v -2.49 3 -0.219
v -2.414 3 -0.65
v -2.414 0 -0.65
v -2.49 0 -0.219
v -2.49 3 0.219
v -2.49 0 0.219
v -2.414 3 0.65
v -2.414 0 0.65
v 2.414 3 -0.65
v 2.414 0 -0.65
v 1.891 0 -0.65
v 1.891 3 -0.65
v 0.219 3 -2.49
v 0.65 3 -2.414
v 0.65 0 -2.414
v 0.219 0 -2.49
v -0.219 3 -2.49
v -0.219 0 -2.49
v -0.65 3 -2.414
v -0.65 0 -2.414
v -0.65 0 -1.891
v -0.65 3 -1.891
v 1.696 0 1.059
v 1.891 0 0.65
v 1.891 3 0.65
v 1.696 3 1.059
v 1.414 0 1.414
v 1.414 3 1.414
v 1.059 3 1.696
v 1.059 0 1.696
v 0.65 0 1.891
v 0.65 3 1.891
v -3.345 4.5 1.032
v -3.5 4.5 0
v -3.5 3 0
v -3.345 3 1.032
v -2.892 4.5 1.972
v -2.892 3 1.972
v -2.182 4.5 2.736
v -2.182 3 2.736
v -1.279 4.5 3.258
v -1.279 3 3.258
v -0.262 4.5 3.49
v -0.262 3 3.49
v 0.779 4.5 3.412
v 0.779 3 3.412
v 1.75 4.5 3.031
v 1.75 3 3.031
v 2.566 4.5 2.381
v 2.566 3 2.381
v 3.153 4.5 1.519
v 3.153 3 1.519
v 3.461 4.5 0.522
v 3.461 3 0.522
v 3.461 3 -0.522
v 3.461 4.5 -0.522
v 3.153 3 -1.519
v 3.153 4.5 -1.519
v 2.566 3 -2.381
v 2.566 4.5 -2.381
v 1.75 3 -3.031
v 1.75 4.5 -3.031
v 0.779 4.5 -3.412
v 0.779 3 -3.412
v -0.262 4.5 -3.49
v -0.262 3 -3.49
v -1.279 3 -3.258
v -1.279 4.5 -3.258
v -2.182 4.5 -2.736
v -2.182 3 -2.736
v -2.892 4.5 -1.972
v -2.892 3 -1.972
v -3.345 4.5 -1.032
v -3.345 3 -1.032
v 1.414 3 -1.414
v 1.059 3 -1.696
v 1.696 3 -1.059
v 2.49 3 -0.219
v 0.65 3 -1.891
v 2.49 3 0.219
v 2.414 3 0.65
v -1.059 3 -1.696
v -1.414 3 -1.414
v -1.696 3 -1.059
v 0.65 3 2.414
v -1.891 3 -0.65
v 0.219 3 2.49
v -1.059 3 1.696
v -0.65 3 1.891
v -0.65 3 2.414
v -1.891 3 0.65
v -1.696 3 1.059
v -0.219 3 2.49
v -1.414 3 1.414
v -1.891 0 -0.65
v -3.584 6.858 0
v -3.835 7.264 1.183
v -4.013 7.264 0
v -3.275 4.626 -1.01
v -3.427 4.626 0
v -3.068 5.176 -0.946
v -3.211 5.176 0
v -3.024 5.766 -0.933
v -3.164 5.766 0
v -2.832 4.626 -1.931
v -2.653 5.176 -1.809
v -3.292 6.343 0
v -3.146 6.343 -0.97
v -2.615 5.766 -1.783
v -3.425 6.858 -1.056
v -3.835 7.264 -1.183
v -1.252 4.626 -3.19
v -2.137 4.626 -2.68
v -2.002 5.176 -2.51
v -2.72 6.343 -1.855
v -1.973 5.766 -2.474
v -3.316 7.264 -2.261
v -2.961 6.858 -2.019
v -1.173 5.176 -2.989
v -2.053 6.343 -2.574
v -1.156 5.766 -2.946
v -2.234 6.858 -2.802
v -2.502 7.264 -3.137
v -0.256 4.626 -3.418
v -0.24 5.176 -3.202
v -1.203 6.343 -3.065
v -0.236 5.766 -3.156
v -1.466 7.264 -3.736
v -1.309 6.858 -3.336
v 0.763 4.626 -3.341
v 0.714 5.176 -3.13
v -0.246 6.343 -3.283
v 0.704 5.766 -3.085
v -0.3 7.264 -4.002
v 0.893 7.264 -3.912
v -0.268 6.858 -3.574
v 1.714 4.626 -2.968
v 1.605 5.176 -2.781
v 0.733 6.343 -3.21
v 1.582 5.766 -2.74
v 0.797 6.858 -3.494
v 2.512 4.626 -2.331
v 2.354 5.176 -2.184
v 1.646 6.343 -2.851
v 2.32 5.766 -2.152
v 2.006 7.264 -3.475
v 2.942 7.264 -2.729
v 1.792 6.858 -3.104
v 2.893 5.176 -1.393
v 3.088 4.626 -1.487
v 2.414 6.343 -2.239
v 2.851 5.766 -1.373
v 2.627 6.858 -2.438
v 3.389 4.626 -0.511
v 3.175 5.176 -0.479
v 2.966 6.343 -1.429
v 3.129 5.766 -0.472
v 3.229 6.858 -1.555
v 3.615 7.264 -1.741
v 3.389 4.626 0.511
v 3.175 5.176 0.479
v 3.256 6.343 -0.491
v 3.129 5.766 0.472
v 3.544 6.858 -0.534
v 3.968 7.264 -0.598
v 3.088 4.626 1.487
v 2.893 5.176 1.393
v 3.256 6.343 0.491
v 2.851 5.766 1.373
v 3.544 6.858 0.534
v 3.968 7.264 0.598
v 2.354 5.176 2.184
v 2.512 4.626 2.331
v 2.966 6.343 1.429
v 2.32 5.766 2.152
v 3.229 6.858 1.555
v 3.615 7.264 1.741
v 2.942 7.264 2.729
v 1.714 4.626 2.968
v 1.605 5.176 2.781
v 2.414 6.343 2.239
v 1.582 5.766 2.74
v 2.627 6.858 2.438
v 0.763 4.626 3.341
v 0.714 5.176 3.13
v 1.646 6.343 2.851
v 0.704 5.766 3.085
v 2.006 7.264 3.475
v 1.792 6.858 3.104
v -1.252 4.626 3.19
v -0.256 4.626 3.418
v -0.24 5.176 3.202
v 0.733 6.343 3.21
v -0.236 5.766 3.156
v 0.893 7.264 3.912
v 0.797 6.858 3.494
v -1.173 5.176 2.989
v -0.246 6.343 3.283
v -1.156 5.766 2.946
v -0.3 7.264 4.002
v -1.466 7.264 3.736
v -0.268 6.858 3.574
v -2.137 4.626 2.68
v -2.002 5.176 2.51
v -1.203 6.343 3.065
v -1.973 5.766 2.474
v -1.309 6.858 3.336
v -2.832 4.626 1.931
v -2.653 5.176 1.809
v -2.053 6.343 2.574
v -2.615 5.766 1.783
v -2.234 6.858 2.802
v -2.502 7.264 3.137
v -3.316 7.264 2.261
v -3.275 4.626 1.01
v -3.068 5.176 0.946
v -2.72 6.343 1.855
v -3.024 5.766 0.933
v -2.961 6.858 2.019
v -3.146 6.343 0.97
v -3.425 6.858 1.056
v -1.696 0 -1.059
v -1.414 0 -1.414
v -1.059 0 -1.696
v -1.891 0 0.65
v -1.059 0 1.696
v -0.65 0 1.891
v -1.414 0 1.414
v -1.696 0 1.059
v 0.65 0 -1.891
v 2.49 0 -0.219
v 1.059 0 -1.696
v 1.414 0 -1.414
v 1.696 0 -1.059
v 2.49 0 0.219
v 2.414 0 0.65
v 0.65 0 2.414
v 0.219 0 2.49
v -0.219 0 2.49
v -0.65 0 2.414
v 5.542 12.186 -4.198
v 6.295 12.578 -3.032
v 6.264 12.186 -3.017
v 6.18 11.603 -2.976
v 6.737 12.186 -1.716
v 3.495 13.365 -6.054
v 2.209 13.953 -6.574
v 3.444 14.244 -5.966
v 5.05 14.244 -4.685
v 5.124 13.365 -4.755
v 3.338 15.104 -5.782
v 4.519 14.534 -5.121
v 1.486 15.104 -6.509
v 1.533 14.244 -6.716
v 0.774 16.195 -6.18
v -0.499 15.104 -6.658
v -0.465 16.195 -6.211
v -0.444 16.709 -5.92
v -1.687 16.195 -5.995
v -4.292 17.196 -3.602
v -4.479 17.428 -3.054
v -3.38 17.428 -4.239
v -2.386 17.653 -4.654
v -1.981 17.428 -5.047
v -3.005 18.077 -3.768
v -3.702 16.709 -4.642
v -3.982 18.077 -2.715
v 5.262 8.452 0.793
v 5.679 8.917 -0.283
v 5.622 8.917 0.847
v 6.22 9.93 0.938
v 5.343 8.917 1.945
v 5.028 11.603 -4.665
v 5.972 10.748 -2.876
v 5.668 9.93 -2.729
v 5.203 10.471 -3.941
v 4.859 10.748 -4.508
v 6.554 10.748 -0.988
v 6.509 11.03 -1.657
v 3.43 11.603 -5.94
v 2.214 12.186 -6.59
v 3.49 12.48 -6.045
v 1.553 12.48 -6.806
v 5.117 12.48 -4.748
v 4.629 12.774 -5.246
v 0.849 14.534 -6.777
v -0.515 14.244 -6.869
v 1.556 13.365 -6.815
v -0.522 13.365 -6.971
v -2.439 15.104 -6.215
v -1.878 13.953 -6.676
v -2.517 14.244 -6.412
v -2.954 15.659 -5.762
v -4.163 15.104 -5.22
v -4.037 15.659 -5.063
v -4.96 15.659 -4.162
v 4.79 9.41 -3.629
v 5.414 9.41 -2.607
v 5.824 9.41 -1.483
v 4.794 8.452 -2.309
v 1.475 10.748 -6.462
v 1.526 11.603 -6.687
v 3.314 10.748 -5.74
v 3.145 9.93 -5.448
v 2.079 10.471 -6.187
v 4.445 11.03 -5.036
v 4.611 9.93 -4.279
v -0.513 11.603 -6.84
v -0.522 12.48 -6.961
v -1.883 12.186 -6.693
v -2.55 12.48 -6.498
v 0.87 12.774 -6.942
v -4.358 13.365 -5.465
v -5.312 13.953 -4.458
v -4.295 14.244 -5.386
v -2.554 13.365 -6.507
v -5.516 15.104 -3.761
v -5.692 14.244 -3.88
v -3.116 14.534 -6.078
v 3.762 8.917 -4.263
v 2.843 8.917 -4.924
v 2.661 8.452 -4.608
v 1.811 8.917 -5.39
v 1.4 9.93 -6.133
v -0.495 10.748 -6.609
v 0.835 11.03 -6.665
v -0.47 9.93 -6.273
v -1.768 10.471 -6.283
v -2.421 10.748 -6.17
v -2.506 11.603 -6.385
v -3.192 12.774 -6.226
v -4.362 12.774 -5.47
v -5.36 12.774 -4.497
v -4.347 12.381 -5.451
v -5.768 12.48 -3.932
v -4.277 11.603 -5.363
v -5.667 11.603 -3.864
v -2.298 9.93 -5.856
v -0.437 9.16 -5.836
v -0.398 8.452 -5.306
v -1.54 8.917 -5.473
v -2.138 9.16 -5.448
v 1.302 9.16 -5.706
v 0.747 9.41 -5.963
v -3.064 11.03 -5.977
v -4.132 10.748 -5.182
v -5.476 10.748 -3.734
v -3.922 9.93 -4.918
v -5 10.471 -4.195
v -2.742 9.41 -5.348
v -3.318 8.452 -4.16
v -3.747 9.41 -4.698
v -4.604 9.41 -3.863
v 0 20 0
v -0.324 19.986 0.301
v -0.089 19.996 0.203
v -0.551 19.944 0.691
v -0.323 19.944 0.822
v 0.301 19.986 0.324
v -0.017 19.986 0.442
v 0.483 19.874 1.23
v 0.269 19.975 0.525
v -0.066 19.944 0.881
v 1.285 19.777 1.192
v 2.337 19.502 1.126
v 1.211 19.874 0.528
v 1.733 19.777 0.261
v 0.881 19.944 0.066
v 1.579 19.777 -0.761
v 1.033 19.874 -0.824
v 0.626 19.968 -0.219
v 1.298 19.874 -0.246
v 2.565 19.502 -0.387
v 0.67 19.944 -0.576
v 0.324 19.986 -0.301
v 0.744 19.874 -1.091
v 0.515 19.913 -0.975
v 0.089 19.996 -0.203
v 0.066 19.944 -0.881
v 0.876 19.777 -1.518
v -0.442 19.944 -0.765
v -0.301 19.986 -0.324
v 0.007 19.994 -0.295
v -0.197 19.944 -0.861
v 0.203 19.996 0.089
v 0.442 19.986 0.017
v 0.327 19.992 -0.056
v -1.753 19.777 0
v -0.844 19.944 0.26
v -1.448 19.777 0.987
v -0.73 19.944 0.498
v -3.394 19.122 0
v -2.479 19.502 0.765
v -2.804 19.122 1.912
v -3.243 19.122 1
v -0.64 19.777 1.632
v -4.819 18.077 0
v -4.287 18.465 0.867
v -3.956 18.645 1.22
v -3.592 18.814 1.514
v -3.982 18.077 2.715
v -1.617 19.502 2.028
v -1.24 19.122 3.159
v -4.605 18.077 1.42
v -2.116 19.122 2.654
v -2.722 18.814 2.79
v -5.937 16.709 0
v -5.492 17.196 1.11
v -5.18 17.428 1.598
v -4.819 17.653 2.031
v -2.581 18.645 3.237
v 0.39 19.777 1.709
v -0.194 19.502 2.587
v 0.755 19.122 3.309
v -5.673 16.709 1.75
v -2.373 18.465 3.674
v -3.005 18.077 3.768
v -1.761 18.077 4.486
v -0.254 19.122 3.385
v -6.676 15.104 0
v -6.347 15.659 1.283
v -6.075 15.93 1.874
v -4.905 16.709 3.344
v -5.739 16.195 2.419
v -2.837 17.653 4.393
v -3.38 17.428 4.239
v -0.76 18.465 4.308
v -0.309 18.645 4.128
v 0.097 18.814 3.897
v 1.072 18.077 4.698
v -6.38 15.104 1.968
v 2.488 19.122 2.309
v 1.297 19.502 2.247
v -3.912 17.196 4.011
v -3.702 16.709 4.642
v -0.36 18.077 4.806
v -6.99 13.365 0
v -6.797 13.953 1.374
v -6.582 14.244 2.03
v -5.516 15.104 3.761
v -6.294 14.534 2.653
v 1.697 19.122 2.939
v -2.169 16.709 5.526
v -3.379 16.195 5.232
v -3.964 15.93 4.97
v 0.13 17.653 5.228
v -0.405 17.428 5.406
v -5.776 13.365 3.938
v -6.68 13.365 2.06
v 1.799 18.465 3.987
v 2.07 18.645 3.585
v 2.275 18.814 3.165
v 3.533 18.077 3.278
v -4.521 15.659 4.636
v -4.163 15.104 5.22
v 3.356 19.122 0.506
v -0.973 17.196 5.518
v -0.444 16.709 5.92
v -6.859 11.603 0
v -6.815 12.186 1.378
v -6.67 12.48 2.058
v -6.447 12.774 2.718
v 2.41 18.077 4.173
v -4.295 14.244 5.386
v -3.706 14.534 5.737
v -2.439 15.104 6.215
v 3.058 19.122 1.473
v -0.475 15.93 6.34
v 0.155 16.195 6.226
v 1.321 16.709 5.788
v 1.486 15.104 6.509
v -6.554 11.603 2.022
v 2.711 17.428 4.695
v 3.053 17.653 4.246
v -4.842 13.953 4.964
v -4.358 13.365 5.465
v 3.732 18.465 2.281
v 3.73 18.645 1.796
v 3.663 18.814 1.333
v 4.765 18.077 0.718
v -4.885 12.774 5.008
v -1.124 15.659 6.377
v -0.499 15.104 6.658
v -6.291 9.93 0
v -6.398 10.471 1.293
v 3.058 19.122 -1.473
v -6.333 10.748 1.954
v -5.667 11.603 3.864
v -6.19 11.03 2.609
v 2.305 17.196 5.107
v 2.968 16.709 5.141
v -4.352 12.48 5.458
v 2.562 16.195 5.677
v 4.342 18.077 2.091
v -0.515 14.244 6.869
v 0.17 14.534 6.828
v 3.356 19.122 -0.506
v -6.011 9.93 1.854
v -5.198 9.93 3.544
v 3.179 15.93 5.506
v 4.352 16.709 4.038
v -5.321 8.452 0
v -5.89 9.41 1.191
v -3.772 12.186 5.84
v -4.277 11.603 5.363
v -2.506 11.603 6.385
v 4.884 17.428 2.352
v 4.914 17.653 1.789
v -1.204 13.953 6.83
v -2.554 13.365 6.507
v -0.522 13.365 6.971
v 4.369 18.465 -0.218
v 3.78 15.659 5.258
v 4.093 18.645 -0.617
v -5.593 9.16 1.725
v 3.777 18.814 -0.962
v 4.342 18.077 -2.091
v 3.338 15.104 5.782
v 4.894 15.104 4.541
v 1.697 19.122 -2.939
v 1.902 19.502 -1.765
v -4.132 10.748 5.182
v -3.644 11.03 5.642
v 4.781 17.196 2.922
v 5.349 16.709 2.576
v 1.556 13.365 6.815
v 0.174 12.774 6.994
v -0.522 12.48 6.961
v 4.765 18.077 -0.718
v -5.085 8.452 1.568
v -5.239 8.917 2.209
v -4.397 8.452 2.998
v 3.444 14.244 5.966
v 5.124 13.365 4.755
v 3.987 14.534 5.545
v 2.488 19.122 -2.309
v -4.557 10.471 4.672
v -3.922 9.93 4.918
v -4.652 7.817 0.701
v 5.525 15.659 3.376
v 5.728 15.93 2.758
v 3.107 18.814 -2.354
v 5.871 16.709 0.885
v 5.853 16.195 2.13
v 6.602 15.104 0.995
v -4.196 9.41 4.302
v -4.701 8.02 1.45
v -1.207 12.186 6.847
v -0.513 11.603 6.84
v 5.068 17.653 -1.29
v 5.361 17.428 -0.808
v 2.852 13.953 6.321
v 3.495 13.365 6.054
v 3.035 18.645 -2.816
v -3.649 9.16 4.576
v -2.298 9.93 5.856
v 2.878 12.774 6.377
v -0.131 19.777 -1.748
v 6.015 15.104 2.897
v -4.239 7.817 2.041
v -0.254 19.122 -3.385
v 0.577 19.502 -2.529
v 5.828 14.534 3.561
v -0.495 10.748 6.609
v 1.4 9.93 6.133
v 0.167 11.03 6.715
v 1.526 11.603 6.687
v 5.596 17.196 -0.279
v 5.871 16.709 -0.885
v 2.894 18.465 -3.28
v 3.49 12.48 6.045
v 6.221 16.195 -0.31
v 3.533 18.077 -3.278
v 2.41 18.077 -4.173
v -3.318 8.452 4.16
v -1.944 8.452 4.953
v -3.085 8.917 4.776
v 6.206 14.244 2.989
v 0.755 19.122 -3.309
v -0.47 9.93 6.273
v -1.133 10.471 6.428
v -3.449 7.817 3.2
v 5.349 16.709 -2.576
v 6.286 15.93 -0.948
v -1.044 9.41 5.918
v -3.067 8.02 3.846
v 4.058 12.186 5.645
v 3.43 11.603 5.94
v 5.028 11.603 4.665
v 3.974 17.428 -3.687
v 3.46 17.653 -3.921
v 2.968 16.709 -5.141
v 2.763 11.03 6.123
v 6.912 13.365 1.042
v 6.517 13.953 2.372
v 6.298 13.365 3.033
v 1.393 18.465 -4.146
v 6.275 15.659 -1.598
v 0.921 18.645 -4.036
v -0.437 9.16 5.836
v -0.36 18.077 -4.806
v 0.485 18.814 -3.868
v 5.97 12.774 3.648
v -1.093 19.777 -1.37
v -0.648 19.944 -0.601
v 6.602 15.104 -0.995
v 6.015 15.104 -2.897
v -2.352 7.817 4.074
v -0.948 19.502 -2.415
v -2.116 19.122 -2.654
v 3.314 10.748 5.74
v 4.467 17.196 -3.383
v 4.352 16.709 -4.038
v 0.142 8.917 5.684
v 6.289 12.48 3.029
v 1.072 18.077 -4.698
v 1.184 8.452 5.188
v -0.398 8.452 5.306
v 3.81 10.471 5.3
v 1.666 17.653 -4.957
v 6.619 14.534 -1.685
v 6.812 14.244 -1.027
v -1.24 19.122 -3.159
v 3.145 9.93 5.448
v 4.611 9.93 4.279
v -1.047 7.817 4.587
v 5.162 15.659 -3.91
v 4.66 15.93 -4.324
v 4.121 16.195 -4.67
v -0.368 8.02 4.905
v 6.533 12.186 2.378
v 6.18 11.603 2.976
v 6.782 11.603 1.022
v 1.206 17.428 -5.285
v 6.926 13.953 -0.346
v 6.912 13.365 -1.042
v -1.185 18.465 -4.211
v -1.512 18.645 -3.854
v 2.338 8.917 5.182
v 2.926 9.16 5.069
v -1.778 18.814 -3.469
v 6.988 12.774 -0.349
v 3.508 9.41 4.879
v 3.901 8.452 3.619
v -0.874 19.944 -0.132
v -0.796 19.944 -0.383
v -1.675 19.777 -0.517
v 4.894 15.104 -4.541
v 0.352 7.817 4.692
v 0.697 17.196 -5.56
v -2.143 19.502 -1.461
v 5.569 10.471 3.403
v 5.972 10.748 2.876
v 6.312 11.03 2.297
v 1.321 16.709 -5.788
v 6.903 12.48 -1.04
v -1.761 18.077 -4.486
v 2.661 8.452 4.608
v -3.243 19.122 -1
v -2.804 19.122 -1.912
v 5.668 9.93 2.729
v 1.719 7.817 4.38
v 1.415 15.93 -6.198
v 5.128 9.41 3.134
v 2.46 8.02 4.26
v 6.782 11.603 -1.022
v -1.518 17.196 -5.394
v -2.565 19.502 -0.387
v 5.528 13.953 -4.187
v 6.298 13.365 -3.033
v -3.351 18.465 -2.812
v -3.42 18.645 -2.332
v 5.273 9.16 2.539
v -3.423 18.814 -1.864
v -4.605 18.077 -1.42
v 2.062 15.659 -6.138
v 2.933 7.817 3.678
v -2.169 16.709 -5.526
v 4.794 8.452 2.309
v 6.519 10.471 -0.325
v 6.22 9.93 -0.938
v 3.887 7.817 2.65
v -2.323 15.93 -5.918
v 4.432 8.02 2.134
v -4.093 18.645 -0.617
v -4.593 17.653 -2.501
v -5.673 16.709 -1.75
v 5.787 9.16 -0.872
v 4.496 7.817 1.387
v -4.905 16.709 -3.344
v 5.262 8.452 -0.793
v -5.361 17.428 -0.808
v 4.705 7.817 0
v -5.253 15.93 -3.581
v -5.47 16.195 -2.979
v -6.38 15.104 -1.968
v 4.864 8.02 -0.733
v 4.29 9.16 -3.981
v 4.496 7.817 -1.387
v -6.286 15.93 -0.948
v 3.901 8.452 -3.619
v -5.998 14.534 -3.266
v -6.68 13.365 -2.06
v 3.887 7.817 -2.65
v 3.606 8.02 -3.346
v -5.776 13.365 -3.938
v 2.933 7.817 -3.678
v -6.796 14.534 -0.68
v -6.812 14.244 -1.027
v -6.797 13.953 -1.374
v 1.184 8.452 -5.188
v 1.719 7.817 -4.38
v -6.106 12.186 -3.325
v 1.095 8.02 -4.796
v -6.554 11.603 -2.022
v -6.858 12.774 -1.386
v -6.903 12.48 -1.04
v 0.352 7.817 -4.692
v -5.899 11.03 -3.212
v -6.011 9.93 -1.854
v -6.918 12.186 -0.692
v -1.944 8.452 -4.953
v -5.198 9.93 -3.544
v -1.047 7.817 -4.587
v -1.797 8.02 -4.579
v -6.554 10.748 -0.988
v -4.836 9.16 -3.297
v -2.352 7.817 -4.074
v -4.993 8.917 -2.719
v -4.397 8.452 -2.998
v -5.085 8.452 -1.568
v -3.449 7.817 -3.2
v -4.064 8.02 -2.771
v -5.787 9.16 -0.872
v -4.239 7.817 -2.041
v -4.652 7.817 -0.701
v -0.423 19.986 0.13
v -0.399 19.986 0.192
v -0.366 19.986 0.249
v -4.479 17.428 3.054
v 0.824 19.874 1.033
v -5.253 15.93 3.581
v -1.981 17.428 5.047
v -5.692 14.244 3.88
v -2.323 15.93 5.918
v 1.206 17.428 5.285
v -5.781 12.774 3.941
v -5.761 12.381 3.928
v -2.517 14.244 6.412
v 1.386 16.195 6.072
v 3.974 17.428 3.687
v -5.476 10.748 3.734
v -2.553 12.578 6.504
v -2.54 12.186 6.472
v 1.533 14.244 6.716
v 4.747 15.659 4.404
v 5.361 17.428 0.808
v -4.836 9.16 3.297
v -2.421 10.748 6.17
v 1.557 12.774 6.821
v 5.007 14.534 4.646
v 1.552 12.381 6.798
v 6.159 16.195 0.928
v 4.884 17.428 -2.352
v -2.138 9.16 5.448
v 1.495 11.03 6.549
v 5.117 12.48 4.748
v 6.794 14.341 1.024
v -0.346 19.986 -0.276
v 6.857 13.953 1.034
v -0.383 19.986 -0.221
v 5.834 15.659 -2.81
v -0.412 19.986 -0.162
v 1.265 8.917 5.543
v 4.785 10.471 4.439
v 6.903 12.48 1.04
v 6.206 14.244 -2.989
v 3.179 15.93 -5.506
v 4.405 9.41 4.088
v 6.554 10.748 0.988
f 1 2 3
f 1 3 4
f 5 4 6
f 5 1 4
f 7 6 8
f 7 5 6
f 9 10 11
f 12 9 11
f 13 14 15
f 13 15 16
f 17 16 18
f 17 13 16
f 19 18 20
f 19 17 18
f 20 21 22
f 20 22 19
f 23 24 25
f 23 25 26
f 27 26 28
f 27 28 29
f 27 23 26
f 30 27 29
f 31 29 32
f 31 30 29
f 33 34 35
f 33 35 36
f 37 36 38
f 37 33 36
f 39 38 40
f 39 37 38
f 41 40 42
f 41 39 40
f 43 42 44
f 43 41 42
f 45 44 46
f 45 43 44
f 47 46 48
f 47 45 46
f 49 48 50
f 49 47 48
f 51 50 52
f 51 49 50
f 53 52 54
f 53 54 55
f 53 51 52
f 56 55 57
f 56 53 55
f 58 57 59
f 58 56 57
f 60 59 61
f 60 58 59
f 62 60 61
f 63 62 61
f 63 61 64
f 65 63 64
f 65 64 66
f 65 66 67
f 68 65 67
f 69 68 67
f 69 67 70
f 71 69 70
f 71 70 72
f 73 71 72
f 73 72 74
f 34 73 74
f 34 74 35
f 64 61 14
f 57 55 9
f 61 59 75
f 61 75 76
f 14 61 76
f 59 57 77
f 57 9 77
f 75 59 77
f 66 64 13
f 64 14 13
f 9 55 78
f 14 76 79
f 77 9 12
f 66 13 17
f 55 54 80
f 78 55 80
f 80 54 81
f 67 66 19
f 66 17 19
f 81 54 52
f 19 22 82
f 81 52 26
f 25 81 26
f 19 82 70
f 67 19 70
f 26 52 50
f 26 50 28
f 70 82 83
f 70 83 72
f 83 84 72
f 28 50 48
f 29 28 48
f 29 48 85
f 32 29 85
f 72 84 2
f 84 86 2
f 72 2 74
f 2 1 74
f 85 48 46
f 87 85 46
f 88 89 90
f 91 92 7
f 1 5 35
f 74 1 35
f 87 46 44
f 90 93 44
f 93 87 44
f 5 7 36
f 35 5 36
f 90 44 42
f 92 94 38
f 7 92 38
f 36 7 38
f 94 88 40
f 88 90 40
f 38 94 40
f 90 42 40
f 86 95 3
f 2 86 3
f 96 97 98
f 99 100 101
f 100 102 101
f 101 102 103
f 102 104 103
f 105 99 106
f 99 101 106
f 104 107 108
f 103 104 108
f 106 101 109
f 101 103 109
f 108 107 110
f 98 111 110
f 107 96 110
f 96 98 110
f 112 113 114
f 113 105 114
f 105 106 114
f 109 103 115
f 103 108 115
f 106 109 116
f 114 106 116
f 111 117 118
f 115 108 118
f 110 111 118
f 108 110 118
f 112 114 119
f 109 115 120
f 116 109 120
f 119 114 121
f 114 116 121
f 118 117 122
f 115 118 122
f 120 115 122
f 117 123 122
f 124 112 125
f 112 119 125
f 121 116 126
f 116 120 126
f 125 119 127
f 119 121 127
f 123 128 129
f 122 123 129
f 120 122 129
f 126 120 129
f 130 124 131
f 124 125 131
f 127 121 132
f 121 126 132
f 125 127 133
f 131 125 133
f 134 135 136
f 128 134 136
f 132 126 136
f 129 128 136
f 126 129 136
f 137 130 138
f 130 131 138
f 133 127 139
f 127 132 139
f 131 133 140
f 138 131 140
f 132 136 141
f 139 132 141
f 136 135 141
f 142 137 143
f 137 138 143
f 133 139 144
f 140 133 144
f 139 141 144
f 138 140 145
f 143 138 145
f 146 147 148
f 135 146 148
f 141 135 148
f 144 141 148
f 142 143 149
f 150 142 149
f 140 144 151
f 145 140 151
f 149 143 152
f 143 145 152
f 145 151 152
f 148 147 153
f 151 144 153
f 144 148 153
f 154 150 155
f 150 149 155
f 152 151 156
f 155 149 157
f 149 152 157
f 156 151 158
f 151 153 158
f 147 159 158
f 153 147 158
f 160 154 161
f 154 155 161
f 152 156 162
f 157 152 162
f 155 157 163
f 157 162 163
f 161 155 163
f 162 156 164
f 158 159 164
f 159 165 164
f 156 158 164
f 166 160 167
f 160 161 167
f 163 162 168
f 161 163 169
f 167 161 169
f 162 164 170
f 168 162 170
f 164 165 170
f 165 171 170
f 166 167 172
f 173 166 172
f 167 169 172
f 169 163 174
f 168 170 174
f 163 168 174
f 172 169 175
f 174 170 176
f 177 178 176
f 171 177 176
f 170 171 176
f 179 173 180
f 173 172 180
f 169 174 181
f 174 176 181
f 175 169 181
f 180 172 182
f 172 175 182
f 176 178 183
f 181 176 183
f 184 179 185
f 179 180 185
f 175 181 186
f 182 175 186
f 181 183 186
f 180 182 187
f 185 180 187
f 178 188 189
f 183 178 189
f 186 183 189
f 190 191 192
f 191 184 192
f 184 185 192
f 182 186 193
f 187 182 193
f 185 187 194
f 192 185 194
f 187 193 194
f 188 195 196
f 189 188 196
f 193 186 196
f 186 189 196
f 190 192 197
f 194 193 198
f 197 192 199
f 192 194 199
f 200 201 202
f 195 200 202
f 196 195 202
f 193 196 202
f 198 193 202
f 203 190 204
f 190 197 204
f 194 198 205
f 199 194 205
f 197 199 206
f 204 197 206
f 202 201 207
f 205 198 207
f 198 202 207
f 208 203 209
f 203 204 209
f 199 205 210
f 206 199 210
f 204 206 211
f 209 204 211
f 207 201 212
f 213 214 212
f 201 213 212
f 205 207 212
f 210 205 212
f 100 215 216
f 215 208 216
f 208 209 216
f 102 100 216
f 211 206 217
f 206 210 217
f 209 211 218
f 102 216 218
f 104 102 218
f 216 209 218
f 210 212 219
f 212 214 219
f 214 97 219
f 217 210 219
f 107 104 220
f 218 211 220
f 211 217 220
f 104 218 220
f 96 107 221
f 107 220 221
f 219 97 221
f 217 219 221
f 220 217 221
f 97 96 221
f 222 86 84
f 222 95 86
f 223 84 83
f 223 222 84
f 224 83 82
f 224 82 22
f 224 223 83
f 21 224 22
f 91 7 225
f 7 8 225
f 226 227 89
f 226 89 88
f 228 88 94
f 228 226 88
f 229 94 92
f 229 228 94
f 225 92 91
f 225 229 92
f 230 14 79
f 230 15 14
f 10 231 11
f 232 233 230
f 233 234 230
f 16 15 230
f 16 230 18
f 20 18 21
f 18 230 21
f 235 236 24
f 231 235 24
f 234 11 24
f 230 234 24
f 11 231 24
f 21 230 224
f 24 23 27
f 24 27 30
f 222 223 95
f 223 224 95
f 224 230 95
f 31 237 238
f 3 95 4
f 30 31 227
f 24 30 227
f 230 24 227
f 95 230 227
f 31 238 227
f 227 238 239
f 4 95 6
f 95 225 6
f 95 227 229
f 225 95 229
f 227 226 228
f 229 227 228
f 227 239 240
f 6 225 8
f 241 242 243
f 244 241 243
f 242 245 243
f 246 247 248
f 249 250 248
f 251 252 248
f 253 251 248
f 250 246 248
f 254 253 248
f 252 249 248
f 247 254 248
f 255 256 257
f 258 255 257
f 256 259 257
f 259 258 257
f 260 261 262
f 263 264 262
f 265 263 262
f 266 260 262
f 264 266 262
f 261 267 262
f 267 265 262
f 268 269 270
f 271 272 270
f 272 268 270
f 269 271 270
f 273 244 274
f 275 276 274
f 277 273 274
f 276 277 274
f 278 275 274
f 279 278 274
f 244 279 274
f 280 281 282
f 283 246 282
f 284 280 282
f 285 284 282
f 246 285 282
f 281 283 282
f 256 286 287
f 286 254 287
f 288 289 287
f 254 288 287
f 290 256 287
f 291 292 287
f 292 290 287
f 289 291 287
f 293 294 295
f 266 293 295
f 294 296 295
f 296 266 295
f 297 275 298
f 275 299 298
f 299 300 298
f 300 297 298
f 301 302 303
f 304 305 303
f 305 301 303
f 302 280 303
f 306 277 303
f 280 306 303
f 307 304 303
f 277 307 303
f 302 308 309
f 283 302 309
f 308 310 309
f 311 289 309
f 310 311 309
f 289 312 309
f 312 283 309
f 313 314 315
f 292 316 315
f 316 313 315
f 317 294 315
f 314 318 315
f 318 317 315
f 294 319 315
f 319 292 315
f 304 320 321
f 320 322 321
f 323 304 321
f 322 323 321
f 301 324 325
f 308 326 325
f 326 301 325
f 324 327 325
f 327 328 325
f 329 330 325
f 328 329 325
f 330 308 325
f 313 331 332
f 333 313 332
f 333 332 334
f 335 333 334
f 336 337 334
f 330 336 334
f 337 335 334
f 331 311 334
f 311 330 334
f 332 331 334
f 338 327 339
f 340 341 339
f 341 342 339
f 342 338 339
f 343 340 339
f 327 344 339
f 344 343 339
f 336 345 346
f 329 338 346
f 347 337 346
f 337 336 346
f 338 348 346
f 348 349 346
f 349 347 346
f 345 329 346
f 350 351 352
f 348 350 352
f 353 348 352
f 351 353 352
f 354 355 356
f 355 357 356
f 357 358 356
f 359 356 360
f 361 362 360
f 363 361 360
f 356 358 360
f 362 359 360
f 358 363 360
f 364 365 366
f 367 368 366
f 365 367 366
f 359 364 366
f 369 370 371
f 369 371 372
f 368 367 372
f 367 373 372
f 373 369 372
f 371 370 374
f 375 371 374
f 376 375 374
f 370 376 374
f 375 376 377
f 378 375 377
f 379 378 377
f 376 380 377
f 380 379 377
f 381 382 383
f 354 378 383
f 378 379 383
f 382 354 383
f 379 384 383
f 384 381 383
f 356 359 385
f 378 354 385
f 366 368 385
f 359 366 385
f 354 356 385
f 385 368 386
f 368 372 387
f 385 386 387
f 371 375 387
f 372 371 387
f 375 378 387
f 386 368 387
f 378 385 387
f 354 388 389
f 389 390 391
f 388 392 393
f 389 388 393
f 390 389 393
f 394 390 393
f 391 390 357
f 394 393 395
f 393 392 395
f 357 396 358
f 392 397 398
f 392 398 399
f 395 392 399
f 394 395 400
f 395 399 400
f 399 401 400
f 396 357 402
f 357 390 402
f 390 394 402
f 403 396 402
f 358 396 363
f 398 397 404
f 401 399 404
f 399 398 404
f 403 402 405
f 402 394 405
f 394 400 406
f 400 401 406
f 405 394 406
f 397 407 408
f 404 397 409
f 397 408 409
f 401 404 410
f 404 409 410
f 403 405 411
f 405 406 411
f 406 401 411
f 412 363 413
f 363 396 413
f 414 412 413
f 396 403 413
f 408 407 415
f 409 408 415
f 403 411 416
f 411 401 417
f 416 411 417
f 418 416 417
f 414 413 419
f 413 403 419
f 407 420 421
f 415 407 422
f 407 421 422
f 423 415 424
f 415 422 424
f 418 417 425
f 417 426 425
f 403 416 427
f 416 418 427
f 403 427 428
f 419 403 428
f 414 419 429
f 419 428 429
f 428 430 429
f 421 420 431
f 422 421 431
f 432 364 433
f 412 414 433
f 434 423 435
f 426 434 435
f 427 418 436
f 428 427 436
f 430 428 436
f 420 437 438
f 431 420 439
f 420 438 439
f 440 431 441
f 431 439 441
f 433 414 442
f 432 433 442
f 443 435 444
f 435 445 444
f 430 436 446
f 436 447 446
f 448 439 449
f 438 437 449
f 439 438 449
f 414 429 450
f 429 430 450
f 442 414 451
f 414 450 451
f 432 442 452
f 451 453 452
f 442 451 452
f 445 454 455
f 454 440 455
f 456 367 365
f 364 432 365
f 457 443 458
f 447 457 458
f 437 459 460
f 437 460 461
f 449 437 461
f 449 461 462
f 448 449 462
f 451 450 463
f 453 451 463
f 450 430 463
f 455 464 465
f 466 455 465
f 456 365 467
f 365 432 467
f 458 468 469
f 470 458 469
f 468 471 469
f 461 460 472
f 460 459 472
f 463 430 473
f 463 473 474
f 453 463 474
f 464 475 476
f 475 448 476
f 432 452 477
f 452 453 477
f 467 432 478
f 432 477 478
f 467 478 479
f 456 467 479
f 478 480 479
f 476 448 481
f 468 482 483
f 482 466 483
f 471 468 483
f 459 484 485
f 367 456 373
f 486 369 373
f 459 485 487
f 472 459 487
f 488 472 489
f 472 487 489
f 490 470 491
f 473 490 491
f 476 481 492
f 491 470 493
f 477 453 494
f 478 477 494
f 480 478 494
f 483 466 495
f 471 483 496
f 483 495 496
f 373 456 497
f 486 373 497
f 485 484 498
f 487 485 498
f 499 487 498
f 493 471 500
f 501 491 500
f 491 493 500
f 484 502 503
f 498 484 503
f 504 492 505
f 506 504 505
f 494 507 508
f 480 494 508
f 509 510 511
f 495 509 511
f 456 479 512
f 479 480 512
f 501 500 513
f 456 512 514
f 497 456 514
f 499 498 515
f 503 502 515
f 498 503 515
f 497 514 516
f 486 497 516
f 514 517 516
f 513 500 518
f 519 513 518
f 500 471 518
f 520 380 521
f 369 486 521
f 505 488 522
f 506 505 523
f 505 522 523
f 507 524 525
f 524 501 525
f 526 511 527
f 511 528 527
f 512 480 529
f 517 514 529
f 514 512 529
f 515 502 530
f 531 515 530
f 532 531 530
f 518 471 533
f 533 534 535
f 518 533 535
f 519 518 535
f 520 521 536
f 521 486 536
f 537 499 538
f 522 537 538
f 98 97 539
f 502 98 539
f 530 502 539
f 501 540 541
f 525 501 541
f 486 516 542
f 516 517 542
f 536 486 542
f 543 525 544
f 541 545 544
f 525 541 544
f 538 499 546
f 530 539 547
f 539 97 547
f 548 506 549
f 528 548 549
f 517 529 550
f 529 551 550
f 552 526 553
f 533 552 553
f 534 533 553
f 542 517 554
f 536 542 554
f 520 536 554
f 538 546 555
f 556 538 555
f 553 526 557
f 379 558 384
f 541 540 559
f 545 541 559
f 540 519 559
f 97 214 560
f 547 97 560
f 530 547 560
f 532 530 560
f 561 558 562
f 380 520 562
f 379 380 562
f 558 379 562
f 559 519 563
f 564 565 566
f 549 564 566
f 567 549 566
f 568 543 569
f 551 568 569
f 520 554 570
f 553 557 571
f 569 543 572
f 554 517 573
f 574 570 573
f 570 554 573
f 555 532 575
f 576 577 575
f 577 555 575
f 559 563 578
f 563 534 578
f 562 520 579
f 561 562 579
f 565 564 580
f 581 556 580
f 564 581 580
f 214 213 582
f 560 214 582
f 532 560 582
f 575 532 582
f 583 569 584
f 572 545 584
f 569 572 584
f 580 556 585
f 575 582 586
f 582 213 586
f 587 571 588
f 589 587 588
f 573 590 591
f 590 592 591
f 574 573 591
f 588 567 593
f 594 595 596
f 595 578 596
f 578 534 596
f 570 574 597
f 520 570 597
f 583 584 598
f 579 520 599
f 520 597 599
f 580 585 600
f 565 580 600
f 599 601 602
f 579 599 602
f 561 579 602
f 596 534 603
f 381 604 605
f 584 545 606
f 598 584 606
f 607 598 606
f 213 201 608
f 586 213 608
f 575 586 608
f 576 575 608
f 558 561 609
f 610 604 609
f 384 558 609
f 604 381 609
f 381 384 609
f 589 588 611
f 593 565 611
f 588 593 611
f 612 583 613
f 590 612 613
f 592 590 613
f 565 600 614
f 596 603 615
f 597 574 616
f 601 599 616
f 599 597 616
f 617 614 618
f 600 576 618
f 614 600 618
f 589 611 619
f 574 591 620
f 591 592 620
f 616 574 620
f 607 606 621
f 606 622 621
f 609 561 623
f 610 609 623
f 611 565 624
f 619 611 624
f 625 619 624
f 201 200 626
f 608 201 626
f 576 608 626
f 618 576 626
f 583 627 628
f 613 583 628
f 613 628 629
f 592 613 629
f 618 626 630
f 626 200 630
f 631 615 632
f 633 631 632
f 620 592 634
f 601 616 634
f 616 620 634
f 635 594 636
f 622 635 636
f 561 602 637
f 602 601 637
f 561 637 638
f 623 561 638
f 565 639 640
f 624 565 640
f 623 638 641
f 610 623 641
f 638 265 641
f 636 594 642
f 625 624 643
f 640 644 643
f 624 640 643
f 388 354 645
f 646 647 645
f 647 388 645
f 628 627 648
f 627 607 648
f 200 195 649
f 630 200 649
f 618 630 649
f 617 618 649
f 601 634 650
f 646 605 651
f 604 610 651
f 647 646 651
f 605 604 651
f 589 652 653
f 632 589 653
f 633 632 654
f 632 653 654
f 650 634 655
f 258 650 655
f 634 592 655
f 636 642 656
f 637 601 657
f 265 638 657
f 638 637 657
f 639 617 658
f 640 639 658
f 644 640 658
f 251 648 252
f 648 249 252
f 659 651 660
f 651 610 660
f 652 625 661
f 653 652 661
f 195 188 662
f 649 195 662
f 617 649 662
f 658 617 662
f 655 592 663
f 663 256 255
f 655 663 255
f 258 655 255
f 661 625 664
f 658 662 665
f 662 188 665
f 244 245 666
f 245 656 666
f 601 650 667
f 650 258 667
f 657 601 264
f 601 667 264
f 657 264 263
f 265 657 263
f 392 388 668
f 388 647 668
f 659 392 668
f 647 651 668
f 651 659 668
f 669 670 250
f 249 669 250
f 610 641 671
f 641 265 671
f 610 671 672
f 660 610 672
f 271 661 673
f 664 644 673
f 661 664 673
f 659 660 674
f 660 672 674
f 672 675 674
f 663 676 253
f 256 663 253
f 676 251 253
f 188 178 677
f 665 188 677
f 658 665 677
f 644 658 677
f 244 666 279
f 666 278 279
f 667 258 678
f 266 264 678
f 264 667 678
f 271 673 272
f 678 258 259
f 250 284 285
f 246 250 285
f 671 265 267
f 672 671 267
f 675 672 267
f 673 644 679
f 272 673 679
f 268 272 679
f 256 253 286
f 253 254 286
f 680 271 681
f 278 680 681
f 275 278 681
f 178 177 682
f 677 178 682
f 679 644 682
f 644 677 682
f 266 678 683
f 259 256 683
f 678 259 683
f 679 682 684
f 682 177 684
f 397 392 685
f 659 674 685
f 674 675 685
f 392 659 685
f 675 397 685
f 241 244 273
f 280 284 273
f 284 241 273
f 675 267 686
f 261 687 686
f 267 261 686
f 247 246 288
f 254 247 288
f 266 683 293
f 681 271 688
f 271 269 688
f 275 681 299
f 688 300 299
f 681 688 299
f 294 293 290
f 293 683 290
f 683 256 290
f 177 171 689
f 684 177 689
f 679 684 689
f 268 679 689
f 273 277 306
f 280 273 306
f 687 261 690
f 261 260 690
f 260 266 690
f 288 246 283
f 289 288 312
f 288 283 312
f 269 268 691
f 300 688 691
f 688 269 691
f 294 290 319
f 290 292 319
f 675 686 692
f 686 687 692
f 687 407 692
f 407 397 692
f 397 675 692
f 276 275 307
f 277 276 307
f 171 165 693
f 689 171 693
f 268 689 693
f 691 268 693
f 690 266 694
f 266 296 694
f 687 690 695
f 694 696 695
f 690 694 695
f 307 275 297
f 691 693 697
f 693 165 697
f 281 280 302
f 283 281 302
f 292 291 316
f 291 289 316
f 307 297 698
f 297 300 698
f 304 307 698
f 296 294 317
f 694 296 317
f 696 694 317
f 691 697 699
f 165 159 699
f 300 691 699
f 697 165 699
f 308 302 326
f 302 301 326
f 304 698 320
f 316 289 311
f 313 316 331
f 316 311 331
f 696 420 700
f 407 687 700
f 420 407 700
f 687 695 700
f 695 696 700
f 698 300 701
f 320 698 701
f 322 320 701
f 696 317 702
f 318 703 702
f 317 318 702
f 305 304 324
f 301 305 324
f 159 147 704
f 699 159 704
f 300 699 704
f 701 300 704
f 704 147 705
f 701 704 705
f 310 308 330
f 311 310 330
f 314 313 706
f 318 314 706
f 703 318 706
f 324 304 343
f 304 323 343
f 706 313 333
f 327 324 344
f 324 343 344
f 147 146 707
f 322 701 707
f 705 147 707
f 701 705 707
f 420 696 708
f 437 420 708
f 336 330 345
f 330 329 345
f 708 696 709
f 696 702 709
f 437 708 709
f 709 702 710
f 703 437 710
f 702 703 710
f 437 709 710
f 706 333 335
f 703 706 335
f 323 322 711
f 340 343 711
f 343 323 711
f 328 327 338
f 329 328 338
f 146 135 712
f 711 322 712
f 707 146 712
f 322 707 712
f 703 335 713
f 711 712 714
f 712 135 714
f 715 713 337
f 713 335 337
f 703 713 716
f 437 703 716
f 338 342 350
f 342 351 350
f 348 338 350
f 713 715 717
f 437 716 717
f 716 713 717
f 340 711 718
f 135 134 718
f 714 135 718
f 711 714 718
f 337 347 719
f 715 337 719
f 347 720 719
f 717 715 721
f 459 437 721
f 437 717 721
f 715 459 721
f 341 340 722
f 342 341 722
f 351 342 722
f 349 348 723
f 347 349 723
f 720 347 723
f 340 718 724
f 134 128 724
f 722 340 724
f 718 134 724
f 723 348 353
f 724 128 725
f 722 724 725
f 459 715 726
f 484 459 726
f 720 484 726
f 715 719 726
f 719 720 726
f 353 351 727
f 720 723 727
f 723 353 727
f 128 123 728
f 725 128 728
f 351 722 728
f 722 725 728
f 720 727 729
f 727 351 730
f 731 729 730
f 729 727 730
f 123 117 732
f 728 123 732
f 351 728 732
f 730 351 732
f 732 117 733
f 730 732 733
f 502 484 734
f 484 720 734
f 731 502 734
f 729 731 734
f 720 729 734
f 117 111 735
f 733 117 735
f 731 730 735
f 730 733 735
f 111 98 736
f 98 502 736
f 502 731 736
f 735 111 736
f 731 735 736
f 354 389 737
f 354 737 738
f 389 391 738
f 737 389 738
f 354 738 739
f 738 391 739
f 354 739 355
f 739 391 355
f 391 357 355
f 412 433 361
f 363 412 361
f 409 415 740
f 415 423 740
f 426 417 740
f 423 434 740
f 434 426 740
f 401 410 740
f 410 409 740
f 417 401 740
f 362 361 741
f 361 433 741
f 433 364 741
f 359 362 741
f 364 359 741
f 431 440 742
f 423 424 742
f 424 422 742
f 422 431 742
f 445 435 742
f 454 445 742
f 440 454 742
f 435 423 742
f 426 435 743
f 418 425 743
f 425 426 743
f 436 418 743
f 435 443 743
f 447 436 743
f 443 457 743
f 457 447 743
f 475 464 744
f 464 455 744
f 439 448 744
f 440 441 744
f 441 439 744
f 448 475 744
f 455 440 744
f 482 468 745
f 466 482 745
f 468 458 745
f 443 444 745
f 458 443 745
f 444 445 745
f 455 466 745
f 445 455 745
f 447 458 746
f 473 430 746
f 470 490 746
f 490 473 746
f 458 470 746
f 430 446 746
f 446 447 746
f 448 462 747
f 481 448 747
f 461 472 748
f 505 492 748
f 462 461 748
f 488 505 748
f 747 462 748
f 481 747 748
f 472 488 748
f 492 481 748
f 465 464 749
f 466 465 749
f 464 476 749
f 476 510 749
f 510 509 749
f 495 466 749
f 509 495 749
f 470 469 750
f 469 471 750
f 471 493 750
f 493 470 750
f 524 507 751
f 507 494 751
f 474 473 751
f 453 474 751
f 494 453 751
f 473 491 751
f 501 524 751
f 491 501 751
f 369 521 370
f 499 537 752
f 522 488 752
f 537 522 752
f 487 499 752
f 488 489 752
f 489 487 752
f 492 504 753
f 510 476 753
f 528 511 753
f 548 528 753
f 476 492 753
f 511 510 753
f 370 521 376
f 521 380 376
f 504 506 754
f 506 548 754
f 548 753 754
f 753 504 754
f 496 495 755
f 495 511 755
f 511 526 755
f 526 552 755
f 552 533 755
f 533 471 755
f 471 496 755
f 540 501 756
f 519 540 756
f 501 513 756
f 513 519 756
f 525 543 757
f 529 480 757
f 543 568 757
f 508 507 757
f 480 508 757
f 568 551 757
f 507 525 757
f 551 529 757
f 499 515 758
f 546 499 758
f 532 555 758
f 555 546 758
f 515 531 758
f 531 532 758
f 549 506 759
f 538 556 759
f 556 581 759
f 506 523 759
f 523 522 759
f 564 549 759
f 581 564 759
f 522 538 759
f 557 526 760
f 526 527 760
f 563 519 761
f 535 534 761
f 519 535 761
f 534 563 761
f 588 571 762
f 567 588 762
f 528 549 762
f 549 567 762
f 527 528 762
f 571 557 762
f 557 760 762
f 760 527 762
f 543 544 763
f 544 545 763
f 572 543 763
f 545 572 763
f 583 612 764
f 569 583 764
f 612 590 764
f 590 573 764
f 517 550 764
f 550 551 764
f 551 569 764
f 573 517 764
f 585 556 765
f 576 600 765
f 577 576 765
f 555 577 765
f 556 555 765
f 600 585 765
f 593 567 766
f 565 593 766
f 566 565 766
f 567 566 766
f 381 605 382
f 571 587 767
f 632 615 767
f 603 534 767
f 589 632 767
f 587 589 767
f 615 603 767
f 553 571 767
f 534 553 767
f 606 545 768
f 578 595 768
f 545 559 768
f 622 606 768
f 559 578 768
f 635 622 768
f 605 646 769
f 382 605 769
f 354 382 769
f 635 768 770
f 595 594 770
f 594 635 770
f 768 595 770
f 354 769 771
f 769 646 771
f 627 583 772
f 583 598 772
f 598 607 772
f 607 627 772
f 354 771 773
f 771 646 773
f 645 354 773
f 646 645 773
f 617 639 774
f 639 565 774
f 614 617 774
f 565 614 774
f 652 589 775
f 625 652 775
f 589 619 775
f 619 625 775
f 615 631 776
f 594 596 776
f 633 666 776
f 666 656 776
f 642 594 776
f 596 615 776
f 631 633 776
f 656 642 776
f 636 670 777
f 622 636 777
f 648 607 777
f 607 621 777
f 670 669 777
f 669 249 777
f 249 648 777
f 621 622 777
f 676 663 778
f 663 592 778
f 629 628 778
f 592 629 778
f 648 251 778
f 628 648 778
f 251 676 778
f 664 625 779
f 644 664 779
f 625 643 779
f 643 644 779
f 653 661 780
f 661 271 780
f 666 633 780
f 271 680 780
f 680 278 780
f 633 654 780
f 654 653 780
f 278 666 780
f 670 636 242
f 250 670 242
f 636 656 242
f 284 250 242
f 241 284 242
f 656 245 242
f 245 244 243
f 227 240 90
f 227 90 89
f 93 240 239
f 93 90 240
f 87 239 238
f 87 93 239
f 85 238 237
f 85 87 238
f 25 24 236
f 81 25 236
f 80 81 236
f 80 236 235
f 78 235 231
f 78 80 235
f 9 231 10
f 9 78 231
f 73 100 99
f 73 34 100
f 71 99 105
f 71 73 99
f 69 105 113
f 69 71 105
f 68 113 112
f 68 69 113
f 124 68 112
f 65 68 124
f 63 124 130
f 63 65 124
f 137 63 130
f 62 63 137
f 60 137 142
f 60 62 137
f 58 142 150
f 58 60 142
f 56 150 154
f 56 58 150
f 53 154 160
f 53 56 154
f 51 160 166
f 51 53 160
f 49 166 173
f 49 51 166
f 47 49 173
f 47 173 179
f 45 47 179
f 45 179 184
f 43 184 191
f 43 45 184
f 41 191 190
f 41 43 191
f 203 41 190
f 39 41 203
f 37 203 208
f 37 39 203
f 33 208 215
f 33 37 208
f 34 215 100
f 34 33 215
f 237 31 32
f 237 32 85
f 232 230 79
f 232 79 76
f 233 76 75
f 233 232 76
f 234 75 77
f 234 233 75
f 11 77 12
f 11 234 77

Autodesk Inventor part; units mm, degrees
ref_plane "YZ Plane" through (0, 0, 0) normal (1, 0, 0) x (0, 1, 0)
ref_plane "XZ Plane" through (0, 0, 0) normal (0, 1, 0) x (-1, 0, 0)
ref_plane "XY Plane" through (0, 0, 0) normal (0, 0, 1) x (1, 0, 0)
sketch "Sketch1" plane through (0, 0, 0) normal (0, 0, 1) x (1, 0, 0)
  line L0 (0, 0) -> (-2.5, 0)
  line L1 (-2.5, 0) -> (-2.5, 3)
  line L2 (-2.5, 3) -> (-3.5, 3)
  line L3 (-3.5, 3) -> (-3.5, 4.5)
  line L4 (0, 0) -> (0, 20)
  line L5 (0, 20) -> (0, 13)
  arc A0 (0, 20) -> (-4.0129, 7.2645) centre (0, 13) ccw
  line L6 (-3.5, 4.5) -> (-3.4274, 4.6257)
  line L7 (-3.5, 4.5) -> (-1.2818, 4.5) construction
  arc A1 (-3.4274, 4.6257) -> (-4.0129, 7.2645) centre (-5.1595, 5.6257) ccw
  point P0 (-2.3909, 6.421)
  dimension "d0" = 2.5
  dimension "d1" = 3
  dimension "d2" = 1
  dimension "d3" = 1.5
  dimension "d4" = 20
  dimension "d5" = 7
  dimension "d6" = 60
  dimension "d7" = 2
revolve "Revolution1" add sketch "Sketch1" angle 360 about axis through (0, 0, 0) along (0, 1, 0)
sketch "Sketch2" plane through (0, 0, 0) normal (0, -1, 0) x (1, 0, 0)
  circle A0 centre (0, 0) radius 2
  circle A1 centre (0, 0) radius 2.5
  line L0 (-2.5, 0.65) -> (2.5, 0.65)
  line L1 (2.5, 0.65) -> (2.5, -0.65)
  line L2 (2.5, -0.65) -> (-2.5, -0.65)
  line L3 (-2.5, -0.65) -> (-2.5, 0.65)
  line L4 (-2.5, 0.65) -> (2.5, -0.65) construction
  line L5 (2.5, 0.65) -> (-2.5, -0.65) construction
  line L6 (-0.65, 2.5) -> (-0.65, -2.5)
  line L7 (-0.65, -2.5) -> (0.65, -2.5)
  line L8 (0.65, -2.5) -> (0.65, 2.5)
  line L9 (0.65, 2.5) -> (-0.65, 2.5)
  circle A2 centre (0, 0) radius 2.5 projected
  line L10 (-0.65, 2.5) -> (0.65, -2.5) construction
  line L11 (-0.65, -2.5) -> (0.65, 2.5) construction
  point P0 (0.65, -1.8914)
  point P1 (0.65, -2.414)
  point P2 (2.414, -0.65)
  point P3 (1.8914, -0.65)
  point P4 (0.65, 2.414)
  point P5 (0.65, 1.8914)
  point P6 (1.8914, 0.65)
  point P7 (2.414, 0.65)
  point P8 (-0.65, 1.8914)
  point P9 (-0.65, 2.414)
  point P10 (-2.414, 0.65)
  point P11 (-1.8914, 0.65)
  point P12 (-0.65, -2.414)
  point P13 (-0.65, -1.8914)
  point P14 (-1.8914, -0.65)
  point P15 (-2.414, -0.65)
  dimension "d9" = 4
  dimension "d10" = 5
  dimension "d11" = 1.3
  dimension "d12" = 1.3
extrude "Extrusion1" cut sketch "Sketch2" against normal blind 3 contours A0 L8 A1 L0 | L2 A1 L8 A0 | A0 L0 A1 L6 | L6 A1 L2 A0
properties part number "Ball"
